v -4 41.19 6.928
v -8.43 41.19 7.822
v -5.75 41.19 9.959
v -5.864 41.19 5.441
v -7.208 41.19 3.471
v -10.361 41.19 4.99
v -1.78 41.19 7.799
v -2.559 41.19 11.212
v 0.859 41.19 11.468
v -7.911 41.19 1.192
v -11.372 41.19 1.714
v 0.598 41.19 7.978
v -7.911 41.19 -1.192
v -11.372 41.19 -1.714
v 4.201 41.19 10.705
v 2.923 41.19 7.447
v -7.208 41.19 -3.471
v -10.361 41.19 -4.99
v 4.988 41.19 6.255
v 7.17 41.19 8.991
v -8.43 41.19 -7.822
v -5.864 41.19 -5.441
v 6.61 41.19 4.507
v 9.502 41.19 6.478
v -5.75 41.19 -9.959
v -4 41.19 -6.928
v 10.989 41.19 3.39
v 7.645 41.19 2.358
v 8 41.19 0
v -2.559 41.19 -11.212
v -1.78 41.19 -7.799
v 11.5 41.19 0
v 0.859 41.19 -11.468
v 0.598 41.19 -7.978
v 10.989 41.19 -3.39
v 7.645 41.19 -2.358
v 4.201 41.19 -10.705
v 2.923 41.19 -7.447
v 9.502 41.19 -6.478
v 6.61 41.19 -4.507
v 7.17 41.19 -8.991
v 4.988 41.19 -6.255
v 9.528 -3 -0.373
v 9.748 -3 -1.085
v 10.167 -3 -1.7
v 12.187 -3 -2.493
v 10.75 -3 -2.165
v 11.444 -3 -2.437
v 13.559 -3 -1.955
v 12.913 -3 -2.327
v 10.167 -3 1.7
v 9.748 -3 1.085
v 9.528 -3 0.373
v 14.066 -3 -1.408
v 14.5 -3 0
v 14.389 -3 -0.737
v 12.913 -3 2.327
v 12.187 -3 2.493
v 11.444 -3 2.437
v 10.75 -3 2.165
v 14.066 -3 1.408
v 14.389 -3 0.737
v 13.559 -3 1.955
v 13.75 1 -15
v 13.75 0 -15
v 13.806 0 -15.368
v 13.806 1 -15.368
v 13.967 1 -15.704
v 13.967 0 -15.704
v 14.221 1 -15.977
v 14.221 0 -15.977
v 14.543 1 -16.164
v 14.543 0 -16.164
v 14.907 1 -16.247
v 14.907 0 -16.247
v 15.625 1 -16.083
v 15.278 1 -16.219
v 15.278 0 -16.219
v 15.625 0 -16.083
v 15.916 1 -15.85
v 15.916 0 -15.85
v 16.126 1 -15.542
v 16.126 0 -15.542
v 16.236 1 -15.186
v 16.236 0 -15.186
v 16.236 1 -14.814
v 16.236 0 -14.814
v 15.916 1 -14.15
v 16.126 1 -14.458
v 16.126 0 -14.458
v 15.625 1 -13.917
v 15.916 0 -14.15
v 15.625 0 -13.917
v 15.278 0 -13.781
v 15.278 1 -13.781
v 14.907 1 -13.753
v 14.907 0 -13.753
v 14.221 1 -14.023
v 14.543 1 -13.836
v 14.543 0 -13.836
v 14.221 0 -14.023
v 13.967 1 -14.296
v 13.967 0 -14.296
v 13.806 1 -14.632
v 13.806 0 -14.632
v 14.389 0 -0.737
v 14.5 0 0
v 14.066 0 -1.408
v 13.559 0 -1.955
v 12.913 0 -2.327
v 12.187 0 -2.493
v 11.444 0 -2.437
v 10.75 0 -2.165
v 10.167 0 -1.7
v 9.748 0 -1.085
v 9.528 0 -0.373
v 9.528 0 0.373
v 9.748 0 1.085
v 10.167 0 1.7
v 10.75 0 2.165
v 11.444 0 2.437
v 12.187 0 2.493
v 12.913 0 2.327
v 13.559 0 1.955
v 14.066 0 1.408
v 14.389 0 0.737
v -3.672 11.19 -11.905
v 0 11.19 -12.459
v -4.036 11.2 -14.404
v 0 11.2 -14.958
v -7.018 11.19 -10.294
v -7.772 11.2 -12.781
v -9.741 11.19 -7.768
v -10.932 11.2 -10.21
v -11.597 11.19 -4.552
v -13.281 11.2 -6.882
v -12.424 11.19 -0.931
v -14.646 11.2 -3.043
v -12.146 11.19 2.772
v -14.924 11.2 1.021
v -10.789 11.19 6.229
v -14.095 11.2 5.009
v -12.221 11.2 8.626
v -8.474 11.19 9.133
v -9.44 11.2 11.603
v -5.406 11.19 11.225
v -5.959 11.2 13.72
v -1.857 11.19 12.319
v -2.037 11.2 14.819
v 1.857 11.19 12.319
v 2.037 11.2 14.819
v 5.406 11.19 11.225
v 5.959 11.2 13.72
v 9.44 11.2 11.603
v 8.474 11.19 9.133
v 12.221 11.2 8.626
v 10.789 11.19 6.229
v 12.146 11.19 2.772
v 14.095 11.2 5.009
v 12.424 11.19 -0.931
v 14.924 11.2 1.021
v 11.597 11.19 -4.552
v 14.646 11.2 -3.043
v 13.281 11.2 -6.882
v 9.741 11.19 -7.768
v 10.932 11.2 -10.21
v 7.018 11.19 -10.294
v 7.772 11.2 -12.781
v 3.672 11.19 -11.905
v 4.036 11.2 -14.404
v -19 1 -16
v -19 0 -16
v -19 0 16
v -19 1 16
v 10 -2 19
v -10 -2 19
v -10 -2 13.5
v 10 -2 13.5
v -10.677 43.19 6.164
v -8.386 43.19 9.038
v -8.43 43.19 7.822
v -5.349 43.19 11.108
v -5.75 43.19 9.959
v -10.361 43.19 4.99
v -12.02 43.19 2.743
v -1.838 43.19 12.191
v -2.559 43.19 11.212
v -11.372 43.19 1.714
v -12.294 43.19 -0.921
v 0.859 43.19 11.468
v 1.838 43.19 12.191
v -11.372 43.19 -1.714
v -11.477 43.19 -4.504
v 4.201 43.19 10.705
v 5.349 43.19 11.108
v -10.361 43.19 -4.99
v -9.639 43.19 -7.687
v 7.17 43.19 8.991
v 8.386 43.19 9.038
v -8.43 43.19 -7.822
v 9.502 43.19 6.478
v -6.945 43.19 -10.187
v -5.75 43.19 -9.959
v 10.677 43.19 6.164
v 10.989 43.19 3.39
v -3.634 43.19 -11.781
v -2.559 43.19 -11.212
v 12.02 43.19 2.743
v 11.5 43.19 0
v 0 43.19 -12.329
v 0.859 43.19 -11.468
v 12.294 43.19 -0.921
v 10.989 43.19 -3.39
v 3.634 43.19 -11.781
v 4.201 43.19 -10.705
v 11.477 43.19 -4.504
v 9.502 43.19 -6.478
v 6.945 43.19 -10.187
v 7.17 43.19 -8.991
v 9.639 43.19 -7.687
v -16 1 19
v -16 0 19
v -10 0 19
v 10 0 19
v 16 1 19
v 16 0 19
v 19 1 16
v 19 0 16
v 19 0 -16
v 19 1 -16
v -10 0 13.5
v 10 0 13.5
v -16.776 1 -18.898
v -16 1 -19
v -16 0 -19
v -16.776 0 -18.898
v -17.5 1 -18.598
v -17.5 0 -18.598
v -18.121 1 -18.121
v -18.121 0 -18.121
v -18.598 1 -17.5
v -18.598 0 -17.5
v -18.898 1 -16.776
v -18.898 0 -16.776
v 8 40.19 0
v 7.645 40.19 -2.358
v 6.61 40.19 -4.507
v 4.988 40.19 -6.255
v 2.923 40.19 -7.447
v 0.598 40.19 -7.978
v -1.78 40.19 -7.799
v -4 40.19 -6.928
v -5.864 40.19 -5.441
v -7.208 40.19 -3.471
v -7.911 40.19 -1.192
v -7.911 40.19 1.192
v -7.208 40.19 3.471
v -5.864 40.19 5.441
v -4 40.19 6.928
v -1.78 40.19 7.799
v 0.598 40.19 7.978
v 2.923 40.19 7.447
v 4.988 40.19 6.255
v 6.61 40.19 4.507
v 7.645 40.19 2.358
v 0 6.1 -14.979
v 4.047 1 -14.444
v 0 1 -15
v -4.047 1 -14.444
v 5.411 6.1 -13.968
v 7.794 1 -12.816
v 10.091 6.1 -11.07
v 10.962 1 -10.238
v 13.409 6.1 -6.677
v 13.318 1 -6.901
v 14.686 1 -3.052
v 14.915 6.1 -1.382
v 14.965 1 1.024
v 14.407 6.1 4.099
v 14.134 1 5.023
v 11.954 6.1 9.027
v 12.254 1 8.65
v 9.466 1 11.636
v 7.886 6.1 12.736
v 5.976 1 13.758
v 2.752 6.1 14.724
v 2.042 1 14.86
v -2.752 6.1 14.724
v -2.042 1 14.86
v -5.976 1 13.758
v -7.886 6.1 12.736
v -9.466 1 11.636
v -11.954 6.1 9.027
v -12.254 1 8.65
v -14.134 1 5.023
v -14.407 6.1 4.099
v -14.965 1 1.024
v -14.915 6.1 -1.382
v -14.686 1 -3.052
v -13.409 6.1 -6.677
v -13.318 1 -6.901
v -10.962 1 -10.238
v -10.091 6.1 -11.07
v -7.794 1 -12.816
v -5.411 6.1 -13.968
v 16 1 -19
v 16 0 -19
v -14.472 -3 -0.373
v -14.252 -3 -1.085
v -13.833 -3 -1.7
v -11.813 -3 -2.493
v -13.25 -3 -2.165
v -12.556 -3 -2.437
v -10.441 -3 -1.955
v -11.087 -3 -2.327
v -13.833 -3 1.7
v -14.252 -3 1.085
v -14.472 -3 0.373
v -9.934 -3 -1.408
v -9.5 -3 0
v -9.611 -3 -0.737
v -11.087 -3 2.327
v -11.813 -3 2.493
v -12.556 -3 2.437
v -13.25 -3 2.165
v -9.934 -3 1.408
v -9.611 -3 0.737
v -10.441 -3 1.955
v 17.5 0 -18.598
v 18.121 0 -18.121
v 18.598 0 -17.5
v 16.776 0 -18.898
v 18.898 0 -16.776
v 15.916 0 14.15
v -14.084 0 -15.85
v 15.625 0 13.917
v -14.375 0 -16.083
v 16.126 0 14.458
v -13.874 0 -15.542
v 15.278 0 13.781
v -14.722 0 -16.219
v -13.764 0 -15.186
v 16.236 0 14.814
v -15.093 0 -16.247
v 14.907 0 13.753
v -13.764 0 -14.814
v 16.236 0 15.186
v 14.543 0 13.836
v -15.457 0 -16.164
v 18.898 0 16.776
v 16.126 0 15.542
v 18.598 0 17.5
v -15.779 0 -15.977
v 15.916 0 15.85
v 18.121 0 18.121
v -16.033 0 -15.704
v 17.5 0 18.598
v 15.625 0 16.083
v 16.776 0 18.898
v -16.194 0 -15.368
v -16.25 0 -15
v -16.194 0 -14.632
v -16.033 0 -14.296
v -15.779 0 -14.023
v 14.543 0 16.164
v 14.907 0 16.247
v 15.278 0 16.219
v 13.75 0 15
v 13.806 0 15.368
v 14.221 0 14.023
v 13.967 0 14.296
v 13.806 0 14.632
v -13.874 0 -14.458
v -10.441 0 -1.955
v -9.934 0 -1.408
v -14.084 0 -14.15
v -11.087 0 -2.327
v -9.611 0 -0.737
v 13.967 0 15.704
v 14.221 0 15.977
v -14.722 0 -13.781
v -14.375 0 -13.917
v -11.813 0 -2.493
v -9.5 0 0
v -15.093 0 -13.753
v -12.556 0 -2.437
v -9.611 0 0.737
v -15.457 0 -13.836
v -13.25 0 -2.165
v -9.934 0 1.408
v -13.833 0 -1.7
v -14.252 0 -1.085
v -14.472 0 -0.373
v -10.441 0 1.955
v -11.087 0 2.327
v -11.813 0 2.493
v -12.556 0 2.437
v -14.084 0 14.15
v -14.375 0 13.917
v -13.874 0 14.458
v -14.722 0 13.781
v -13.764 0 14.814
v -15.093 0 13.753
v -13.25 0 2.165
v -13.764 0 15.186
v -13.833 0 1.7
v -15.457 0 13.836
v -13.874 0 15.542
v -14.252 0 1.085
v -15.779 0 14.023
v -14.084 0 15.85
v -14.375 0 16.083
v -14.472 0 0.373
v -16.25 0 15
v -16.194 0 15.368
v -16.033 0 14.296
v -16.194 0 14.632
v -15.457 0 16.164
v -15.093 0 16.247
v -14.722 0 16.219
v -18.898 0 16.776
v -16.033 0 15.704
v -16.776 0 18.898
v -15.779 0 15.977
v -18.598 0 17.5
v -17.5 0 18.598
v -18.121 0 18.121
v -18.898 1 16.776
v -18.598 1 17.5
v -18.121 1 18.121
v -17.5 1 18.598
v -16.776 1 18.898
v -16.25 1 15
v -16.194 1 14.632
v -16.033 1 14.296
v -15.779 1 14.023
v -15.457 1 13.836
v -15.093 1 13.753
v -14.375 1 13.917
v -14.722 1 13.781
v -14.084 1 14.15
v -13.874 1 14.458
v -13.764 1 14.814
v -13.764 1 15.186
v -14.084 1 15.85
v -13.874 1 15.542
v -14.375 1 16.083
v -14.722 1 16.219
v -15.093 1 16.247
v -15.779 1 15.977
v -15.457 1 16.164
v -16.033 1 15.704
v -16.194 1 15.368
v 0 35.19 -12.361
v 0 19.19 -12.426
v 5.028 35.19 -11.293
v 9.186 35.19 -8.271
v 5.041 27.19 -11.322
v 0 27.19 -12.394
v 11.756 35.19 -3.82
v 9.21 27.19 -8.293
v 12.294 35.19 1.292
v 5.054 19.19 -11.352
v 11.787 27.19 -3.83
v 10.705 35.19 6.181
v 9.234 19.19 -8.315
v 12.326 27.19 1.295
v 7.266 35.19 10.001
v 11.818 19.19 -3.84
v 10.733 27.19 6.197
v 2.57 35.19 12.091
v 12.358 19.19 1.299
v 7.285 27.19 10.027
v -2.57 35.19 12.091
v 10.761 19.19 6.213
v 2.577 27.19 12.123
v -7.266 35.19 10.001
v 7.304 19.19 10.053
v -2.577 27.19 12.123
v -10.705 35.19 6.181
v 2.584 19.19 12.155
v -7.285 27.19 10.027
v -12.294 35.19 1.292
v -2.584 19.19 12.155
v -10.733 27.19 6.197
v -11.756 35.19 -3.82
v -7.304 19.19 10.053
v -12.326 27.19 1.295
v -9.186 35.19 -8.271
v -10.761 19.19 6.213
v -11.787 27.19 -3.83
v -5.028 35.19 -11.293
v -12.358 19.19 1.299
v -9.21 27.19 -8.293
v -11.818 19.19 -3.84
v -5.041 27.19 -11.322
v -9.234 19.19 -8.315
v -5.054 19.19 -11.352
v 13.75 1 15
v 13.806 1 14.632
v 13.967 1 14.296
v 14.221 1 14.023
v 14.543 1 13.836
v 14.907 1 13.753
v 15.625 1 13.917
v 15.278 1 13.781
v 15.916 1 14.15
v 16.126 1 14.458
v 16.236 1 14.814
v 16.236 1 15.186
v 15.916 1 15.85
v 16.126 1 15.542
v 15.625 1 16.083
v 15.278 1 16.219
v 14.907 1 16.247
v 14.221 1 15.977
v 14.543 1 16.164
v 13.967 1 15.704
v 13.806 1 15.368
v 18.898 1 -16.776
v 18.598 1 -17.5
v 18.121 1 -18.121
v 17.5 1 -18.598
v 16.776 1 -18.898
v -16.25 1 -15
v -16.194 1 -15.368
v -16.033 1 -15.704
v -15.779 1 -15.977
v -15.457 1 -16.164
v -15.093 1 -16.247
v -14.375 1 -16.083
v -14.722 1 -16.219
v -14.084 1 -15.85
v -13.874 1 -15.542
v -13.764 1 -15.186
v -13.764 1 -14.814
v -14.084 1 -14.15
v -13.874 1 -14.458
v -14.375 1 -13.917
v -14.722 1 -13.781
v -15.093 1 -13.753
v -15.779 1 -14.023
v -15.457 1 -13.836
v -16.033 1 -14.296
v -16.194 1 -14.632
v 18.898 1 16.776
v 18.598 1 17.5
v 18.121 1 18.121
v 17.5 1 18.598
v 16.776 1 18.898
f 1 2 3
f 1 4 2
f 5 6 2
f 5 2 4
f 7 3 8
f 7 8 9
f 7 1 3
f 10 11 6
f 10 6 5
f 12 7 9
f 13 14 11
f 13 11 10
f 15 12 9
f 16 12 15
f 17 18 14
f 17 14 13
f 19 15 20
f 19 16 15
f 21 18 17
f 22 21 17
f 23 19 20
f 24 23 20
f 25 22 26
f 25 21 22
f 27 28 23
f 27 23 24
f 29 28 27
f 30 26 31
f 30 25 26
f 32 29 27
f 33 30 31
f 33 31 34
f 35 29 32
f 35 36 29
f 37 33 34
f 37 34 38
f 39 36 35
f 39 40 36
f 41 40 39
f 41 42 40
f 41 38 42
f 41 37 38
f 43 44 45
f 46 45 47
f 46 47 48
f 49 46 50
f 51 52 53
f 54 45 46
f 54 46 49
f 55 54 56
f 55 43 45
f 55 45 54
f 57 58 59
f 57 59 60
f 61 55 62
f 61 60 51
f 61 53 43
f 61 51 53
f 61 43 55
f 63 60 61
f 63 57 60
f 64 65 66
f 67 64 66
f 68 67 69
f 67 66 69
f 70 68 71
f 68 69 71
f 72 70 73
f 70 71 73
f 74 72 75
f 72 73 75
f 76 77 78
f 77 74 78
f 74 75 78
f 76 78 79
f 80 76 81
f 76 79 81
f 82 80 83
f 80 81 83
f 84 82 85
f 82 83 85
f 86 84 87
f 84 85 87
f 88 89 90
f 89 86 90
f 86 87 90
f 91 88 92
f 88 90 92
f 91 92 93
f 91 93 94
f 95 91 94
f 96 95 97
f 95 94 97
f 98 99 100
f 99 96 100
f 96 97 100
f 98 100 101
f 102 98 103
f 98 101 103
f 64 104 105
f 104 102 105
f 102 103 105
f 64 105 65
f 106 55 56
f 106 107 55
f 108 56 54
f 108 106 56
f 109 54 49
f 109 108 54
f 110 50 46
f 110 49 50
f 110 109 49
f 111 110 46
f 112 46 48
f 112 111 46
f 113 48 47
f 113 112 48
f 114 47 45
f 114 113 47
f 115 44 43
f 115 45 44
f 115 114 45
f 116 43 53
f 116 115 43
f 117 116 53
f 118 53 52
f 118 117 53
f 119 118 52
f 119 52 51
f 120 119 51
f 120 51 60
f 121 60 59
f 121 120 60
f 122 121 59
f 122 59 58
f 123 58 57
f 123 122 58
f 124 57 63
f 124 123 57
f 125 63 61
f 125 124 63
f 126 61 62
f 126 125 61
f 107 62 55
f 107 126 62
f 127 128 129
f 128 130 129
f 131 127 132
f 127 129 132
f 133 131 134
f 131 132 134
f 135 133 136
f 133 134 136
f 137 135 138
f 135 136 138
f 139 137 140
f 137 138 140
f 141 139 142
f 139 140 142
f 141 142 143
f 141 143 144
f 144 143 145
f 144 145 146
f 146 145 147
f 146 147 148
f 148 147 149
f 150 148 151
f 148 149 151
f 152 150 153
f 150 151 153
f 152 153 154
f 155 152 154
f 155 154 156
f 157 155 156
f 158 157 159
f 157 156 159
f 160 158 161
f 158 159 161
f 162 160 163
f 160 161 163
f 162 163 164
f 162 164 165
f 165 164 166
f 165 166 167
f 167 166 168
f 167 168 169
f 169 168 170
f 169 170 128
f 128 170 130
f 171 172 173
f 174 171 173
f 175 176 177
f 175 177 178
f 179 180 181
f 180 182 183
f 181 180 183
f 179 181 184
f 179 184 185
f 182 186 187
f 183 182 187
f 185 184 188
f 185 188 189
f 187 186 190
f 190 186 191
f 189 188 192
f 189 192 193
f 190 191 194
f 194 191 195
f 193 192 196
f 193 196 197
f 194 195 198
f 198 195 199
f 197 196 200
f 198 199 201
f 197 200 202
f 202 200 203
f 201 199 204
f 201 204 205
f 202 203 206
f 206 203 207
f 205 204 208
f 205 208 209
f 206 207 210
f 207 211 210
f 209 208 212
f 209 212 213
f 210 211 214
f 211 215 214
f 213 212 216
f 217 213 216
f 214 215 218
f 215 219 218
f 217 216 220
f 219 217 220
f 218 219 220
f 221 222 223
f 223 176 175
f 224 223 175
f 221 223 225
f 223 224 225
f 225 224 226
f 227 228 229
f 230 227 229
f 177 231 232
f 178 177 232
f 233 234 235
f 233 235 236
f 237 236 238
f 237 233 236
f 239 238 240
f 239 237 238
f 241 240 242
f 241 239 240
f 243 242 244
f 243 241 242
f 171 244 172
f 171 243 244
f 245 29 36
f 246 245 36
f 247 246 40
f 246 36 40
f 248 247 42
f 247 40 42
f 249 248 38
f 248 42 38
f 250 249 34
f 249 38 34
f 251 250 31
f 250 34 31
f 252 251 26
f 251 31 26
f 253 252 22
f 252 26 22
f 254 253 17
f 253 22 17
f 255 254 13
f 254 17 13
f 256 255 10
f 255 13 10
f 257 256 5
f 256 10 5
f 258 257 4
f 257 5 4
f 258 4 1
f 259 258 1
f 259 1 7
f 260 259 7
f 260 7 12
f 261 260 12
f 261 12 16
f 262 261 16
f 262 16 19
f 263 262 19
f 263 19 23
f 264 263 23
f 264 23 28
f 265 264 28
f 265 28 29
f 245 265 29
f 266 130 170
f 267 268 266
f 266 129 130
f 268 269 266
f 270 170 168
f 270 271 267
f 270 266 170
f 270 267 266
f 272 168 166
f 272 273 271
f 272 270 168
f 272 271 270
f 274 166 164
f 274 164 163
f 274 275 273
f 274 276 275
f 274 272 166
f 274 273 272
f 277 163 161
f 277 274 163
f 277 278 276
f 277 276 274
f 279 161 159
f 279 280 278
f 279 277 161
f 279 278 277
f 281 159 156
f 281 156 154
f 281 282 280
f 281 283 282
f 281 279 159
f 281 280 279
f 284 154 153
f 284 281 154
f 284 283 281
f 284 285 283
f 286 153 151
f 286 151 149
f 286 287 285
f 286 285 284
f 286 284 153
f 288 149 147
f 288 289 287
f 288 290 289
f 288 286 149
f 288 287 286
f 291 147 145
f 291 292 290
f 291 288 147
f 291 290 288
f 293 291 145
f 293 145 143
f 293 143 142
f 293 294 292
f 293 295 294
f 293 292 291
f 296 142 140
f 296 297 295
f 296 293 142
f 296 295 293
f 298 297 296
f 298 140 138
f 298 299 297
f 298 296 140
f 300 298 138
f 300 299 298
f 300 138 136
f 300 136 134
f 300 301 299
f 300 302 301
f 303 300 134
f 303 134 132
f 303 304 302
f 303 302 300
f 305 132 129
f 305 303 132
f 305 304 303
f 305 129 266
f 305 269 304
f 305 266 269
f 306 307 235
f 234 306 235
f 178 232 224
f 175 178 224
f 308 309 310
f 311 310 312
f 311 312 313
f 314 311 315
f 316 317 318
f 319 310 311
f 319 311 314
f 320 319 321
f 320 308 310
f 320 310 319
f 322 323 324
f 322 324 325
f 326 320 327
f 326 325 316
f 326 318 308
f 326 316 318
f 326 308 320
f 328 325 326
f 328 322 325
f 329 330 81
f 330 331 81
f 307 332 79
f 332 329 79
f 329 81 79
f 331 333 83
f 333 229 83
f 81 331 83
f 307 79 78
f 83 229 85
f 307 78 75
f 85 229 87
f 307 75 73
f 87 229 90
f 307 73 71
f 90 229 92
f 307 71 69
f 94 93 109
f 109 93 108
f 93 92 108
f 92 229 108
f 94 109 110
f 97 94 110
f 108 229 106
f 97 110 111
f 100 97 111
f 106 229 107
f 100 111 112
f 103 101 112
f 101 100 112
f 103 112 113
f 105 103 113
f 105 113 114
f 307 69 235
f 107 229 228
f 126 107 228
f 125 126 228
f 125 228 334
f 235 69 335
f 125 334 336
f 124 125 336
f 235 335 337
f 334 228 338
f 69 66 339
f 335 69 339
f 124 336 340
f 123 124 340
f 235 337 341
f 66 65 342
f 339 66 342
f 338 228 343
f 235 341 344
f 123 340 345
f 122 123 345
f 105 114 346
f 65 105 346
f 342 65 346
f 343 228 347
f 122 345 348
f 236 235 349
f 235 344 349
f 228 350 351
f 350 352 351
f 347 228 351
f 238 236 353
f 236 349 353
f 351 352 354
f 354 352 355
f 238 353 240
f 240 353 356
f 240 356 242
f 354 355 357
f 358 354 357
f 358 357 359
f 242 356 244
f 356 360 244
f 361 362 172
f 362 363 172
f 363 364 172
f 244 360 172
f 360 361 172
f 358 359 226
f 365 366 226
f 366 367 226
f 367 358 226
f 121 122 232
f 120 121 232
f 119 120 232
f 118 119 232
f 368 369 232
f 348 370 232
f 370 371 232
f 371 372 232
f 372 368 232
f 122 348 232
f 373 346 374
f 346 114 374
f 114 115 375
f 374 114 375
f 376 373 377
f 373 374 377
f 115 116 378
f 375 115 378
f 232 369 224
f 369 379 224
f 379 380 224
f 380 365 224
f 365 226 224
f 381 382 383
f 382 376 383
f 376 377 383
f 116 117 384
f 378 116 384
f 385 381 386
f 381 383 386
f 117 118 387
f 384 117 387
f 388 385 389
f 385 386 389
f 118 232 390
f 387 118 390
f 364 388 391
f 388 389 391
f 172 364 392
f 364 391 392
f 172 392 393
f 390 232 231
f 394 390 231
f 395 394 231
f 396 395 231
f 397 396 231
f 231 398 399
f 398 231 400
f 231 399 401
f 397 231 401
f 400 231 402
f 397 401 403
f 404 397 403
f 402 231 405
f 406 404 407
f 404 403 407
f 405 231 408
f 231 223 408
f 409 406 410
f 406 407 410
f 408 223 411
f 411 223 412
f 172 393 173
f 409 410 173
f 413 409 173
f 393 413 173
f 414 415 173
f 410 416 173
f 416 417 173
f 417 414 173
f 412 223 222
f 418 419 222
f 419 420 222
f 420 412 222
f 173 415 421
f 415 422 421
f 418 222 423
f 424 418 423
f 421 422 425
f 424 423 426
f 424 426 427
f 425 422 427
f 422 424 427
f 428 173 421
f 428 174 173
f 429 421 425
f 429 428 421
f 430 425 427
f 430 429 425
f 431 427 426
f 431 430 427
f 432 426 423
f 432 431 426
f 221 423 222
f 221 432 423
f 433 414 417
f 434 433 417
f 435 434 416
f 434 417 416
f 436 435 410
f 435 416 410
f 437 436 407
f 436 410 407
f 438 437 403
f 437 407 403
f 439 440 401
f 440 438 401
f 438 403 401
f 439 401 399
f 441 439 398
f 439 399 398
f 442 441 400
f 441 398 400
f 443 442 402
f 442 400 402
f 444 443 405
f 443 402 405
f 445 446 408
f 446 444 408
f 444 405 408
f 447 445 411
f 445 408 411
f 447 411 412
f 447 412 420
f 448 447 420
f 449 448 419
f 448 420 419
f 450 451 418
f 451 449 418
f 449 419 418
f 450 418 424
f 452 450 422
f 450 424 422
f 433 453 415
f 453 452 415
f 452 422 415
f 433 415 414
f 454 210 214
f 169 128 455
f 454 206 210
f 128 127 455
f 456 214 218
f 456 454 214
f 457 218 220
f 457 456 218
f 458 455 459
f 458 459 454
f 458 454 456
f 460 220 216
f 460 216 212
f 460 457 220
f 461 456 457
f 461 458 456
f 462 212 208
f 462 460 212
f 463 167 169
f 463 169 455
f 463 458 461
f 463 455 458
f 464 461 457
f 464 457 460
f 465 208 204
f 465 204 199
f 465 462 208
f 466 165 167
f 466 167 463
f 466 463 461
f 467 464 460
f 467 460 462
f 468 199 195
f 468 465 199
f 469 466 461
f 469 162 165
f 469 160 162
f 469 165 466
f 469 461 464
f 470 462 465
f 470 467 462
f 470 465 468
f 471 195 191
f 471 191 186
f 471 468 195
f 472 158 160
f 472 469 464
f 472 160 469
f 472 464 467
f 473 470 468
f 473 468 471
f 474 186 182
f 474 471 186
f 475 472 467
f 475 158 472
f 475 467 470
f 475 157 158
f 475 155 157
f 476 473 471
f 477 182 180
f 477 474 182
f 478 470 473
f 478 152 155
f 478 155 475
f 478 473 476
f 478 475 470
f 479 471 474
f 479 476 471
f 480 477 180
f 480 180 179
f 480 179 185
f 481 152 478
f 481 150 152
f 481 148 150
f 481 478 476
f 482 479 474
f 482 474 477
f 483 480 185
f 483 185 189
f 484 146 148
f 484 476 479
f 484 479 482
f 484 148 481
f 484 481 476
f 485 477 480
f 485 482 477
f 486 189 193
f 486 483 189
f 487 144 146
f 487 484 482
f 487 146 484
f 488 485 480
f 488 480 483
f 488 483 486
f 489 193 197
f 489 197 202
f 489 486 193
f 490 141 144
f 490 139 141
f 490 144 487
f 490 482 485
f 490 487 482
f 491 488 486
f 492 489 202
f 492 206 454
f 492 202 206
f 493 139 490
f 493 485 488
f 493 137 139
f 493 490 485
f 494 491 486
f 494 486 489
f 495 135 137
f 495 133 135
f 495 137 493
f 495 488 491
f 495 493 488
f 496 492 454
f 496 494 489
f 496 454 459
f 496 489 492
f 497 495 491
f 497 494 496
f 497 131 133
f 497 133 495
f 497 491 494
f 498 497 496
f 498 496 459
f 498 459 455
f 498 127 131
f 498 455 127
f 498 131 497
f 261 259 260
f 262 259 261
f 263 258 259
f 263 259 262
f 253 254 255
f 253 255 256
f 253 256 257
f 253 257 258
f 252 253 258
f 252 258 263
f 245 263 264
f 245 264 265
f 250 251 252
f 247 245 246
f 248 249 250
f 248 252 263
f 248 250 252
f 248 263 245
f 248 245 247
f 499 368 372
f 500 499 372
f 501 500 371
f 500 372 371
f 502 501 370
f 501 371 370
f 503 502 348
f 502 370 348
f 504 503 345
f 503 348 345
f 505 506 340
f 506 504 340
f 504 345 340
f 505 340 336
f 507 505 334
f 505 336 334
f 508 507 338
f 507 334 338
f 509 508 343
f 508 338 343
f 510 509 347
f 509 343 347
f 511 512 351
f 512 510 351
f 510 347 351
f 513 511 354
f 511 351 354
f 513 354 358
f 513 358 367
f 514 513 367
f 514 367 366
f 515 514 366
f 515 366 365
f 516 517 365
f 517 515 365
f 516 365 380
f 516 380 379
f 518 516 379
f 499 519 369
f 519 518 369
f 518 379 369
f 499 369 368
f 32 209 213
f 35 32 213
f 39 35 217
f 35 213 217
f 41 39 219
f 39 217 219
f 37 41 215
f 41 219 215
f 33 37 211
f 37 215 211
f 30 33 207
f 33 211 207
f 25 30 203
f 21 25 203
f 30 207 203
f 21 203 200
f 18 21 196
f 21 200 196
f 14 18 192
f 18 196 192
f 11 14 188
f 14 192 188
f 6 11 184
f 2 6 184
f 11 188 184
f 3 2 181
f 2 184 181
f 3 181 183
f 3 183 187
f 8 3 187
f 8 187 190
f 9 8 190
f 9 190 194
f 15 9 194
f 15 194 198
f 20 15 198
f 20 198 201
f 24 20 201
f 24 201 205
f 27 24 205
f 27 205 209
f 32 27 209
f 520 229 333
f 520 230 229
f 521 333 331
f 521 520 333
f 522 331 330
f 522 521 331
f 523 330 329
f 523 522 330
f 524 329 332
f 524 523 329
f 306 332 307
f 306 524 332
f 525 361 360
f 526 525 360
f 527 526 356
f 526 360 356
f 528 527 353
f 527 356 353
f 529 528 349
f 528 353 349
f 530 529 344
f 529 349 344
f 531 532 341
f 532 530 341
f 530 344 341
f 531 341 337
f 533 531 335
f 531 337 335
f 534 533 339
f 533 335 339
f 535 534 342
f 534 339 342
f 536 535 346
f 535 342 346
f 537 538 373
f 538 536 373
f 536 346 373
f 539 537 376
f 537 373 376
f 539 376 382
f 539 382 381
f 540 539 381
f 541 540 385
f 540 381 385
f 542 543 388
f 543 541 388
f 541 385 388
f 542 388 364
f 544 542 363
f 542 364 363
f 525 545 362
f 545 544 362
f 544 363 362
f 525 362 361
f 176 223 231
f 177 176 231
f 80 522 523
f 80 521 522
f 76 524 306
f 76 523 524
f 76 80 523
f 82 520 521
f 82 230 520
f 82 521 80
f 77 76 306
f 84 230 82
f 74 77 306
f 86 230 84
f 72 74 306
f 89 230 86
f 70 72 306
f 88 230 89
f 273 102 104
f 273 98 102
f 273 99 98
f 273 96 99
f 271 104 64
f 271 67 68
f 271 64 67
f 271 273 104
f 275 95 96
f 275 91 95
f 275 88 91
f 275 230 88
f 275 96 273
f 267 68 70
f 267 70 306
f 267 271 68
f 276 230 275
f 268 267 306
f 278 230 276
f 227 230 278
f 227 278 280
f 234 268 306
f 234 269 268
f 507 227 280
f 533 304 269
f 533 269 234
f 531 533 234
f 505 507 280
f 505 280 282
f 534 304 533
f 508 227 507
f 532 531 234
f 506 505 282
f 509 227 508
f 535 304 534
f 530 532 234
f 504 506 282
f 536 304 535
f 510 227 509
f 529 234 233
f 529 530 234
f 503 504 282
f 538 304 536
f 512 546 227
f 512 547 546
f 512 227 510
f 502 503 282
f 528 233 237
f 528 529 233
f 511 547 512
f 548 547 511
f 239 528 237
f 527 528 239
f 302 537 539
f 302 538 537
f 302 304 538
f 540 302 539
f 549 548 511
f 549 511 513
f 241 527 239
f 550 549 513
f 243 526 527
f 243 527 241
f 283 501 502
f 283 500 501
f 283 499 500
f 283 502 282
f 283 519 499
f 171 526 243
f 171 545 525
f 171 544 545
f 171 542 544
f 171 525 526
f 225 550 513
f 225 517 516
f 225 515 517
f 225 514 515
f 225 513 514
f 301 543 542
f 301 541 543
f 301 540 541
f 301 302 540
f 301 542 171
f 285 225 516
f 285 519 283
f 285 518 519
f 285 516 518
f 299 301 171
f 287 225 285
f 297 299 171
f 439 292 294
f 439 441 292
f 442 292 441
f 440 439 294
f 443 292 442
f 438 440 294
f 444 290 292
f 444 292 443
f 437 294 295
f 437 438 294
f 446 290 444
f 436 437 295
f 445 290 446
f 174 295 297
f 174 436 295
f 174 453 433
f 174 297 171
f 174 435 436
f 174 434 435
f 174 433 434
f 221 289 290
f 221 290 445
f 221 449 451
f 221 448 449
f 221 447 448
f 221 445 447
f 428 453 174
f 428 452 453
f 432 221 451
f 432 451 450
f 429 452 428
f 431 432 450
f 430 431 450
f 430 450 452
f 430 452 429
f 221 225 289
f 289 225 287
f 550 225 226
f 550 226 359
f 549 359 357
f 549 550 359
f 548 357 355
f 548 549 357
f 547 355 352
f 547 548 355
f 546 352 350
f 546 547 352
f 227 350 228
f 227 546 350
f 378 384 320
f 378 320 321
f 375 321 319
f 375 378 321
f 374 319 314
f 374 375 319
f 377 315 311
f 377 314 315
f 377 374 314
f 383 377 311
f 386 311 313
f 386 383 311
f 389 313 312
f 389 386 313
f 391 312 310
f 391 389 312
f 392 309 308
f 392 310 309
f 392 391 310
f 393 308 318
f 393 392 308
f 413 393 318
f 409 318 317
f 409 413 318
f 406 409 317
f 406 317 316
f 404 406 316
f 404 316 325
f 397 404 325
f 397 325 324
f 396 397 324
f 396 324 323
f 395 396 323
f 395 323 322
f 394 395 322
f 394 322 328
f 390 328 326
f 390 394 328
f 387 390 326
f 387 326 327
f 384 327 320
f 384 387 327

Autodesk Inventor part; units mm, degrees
ref_plane "YZ Plane" through (0, 0, 0) normal (1, 0, 0) x (0, 1, 0)
ref_plane "XZ Plane" through (0, 0, 0) normal (0, 1, 0) x (-1, 0, 0)
ref_plane "XY Plane" through (0, 0, 0) normal (0, 0, 1) x (1, 0, 0)
sketch "Sketch1" plane through (0, 0, 0) normal (0, 1, 0) x (-1, 0, 0)
  line L0 (19, 19) -> (-19, 19)
  line L1 (-19, 19) -> (-19, -19)
  line L2 (-19, -19) -> (19, -19)
  line L3 (19, -19) -> (19, 19)
  line L4 (19, 19) -> (-19, -19) construction
  line L5 (-19, 19) -> (19, -19) construction
  line L6 (15, 15) -> (-15, 15) construction
  line L7 (-15, 15) -> (-15, -15) construction
  line L8 (-15, -15) -> (15, -15) construction
  line L9 (15, -15) -> (15, 15) construction
  line L10 (15, 15) -> (-15, -15) construction
  line L11 (-15, 15) -> (15, -15) construction
  circle A0 centre (15, 15) radius 1.25
  circle A1 centre (15, -15) radius 1.25
  circle A2 centre (-15, -15) radius 1.25
  circle A3 centre (-15, 15) radius 1.25
  point P0 (0, 0)
  dimension "d0" = 38
  dimension "d1" = 38
  dimension "d2" = 30
  dimension "d3" = 30
  dimension "d4" = 2.5
  dimension "d5" = 2.5
  dimension "d6" = 2.5
  dimension "d7" = 2.5
extrude "Extrusion1" add sketch "Sketch1" along normal blind 1
fillet "Fillet1" radius 3 4 edges at (19, 0.5, 19) (19, 0.5, -19) (-19, 0.5, -19) (-19, 0.5, 19)
sketch "Sketch2" plane through (0, 0, 0) normal (1, 0, 0) x (0, 1, 0)
  line L0 (43.1895, 0) -> (0.9392, 0)
  line L1 (1, 16) -> (1, -16) construction
  line L2 (0, 16) -> (0, -16) projected
  line L3 (0.9392, 0) -> (1, -14.9999)
  line L4 (1, -16) -> (1, 16) projected
  line L5 (1, -14.9999) -> (11.1999, -14.9585)
  line L6 (11.1999, -14.9585) -> (11.1898, -12.4586)
  line L7 (11.1898, -12.4586) -> (43.1895, -12.3289)
  line L8 (43.1895, -12.3289) -> (43.1895, 0)
  point P0 (0, 0)
  dimension "d16" = 15
  dimension "d17" = 10.2
  dimension "d18" = 2.5
  dimension "d19" = 32
revolve "Revolution1" add sketch "Sketch2" angle 360 about axis through (0, 43.1895, 0) along (0, -1, 0)
sketch "Sketch3" plane through (0, 43.1895, 0) normal (0, 1, 0) x (1, 0, 0)
  circle A0 centre (0, 0) radius 11.5
  dimension "d20" = 23
extrude "Extrusion2" cut sketch "Sketch3" against normal blind 2
sketch "Sketch4" plane through (0, 41.1895, 0) normal (0, 1, 0) x (1, 0, 0)
  circle A0 centre (0, 0) radius 8
  dimension "d23" = 16
extrude "Extrusion3" cut sketch "Sketch4" against normal blind 1
sketch "Sketch5" plane through (0, 0, 0) normal (0, -1, 0) x (1, 0, 0)
  circle A0 centre (-12, 0) radius 2.5
  line L0 (-19, -16) -> (-19, 16) projected
  circle A1 centre (12, 0) radius 2.5
  line L1 (19, 16) -> (19, -16) projected
  point P0 (0, 0)
  dimension "d26" = 5
  dimension "d27" = 7
  dimension "d28" = 5
  dimension "d29" = 7
extrude "Extrusion4" add sketch "Sketch5" along normal blind 3
sketch "Sketch6" plane through (0, 0, 0) normal (0, -1, 0) x (1, 0, 0)
  line L0 (-16, 19) -> (16, 19) projected
  line L1 (-10, 13.5) -> (10, 13.5)
  line L2 (10, 13.5) -> (10, 19)
  line L3 (10, 19) -> (-10, 19)
  line L4 (-10, 19) -> (-10, 13.5)
  line L5 (-10, 13.5) -> (10, 19) construction
  line L6 (10, 13.5) -> (-10, 19) construction
  point P0 (0, 0)
  point P1 (0, 16.25)
  dimension "d32" = 20
  dimension "d33" = 5.5
extrude "Extrusion5" add sketch "Sketch6" along normal blind 2
properties part number "camera"
